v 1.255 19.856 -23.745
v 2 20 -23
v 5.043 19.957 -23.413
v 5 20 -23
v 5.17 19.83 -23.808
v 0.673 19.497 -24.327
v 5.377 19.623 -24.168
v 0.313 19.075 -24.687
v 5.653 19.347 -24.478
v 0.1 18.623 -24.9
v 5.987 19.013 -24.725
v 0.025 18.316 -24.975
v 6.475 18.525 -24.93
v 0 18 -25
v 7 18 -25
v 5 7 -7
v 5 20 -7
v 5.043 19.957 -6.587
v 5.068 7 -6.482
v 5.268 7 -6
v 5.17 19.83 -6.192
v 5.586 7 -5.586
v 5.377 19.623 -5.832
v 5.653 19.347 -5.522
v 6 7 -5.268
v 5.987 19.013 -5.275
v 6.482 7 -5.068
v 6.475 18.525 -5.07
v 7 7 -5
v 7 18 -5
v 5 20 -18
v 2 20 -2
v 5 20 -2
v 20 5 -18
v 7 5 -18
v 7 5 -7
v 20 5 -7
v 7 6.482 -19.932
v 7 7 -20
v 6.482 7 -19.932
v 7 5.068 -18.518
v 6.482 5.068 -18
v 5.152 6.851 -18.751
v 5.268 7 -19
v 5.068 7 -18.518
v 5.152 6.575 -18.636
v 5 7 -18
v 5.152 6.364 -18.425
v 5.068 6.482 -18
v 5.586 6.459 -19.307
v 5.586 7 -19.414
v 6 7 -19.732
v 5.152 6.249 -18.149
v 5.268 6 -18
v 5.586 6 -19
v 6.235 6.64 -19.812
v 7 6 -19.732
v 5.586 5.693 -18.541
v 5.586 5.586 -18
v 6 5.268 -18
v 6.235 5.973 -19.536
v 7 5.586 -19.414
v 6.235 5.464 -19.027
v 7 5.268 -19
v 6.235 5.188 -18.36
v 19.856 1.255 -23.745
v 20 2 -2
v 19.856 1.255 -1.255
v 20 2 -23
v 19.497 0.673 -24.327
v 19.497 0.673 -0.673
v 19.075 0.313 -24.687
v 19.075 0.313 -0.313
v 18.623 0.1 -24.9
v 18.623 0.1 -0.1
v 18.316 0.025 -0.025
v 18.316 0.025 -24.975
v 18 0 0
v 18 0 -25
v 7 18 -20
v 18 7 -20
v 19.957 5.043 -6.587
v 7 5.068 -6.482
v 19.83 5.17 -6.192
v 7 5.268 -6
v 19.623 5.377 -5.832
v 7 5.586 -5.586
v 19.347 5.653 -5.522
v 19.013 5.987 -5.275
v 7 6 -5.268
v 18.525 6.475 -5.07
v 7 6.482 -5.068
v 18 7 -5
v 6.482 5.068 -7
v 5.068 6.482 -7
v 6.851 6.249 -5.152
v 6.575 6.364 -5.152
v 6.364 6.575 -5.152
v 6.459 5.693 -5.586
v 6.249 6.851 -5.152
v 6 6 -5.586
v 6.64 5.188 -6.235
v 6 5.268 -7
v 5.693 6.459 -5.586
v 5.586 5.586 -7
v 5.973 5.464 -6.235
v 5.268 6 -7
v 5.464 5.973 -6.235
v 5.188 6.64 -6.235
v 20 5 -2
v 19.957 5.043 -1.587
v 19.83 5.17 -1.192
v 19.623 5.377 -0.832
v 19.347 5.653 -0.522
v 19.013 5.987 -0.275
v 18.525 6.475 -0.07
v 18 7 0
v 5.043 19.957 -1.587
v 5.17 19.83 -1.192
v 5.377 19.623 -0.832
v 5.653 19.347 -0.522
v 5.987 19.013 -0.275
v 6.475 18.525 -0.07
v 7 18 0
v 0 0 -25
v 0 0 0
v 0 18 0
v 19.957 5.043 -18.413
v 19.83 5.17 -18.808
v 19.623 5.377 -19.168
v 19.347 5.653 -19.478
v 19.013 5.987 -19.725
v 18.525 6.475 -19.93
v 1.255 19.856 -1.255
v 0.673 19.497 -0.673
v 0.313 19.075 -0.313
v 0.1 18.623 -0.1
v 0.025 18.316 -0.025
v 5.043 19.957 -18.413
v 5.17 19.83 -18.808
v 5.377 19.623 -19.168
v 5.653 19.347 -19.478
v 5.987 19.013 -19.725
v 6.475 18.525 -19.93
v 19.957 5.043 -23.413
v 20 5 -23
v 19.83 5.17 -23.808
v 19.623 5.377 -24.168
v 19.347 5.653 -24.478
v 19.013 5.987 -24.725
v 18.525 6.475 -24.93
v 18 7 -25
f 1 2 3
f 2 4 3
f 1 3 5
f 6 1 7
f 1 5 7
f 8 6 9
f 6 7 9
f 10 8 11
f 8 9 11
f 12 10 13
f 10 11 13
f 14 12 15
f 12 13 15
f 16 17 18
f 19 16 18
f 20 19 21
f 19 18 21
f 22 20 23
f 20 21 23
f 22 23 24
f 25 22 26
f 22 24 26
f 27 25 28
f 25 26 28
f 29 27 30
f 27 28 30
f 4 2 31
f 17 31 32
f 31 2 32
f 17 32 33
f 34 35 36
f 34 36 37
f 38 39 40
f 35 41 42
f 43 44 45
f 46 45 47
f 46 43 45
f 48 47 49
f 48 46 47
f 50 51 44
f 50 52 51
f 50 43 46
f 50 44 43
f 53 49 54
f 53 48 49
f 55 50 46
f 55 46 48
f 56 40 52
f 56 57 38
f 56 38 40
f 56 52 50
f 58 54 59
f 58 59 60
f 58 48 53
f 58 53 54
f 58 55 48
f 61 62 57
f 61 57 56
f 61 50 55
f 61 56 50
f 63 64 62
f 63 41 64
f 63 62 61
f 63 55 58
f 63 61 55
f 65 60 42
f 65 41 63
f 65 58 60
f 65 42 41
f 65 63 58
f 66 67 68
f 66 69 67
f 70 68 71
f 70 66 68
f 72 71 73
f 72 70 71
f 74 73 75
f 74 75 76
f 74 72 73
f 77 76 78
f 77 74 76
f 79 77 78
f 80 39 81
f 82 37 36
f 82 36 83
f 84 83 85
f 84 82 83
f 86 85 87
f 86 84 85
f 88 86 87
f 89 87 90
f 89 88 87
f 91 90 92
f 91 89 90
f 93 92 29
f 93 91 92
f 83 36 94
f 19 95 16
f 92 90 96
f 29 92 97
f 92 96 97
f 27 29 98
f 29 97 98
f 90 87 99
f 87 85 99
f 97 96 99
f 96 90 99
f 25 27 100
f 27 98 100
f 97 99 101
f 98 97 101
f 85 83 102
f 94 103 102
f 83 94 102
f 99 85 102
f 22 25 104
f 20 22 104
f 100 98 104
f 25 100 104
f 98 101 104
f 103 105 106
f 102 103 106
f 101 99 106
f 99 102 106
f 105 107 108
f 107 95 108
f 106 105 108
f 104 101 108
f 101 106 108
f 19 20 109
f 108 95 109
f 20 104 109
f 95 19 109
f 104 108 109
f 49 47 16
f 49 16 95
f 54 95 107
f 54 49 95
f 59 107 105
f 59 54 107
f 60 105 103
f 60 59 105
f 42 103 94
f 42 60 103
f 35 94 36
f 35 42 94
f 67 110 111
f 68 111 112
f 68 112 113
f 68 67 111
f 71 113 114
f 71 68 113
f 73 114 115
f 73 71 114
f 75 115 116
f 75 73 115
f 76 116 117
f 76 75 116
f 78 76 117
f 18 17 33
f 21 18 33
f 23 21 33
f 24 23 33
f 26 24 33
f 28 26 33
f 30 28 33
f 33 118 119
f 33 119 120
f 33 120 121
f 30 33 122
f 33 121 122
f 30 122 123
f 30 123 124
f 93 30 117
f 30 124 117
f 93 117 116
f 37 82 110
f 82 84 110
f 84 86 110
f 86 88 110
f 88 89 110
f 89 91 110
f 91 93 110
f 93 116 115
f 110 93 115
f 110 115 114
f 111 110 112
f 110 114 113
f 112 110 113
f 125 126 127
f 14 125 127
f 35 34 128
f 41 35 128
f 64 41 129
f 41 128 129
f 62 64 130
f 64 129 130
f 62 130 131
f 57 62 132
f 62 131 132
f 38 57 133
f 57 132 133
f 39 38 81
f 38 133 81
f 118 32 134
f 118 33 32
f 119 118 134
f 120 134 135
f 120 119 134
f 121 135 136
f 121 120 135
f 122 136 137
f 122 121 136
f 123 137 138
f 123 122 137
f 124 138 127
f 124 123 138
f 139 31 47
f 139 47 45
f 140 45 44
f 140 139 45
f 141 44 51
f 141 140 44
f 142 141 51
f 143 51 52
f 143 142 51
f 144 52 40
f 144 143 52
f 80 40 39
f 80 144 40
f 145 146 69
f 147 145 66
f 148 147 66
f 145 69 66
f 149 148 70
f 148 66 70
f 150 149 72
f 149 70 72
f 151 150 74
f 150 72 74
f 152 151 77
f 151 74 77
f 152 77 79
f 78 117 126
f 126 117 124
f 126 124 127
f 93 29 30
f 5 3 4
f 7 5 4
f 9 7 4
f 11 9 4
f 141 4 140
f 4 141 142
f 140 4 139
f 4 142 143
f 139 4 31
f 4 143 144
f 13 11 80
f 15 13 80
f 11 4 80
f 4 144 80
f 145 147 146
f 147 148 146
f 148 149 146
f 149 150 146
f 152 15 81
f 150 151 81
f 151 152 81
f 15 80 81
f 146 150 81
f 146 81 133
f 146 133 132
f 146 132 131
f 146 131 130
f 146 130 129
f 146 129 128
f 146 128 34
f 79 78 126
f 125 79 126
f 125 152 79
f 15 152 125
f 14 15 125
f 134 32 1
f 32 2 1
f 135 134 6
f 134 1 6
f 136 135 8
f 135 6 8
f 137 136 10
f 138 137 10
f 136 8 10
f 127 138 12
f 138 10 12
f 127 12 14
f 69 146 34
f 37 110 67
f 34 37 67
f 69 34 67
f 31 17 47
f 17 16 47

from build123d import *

# Parameters (mm, degrees)
BOSS_EXTRUDE2_DEPTH = 25
SHELL1_START        = 5
SHELL1_OUTLINE_W    = 16
SHELL1_OUTLINE_H    = 15
SHELL1_DEPTH        = 15
FILLET1_R           = 2
FILLET3_R           = 2


# Read off the part's stored shape, not the designer's step: Shell1
with BuildPart() as part:
    # Sketch1 → Boss-Extrude2 (new body)
    with BuildSketch(Plane.XY):
        Polygon((0, 0), (0, 20), (5, 20), (20, 5), (20, 0), align=None)
    extrude(amount=-BOSS_EXTRUDE2_DEPTH)

    # Shell1 outline → Shell1 (cut)
    with BuildSketch(Plane(origin=(0, 0, 0), x_dir=(1, 0, 0), z_dir=(0, 1, 0)).offset(SHELL1_START)):
        with Locations((13, 12.5)):
            Rectangle(SHELL1_OUTLINE_W, SHELL1_OUTLINE_H)
    extrude(amount=SHELL1_DEPTH, mode=Mode.SUBTRACT)

    # Fillet1
    fillet1_edges = [part.edges().sort_by_distance(p)[0] for p in [
        (12.5, 5, -20),
        (5, 12.5, -20),
        (5, 5, -12.5),
        (12.5, 5, -5),
        (5, 12.5, -5),
    ]]
    fillet(fillet1_edges, radius=FILLET1_R)

    # Fillet3
    fillet3_edges = [part.edges().sort_by_distance(p)[0] for p in [
        (2.5, 20, -25),
        (2.5, 20, 0),
        (20, 2.5, 0),
        (20, 2.5, -25),
        (0, 20, -12.5),
        (20, 0, -12.5),
    ]]
    fillet(fillet3_edges, radius=FILLET3_R)


solid = part.part
